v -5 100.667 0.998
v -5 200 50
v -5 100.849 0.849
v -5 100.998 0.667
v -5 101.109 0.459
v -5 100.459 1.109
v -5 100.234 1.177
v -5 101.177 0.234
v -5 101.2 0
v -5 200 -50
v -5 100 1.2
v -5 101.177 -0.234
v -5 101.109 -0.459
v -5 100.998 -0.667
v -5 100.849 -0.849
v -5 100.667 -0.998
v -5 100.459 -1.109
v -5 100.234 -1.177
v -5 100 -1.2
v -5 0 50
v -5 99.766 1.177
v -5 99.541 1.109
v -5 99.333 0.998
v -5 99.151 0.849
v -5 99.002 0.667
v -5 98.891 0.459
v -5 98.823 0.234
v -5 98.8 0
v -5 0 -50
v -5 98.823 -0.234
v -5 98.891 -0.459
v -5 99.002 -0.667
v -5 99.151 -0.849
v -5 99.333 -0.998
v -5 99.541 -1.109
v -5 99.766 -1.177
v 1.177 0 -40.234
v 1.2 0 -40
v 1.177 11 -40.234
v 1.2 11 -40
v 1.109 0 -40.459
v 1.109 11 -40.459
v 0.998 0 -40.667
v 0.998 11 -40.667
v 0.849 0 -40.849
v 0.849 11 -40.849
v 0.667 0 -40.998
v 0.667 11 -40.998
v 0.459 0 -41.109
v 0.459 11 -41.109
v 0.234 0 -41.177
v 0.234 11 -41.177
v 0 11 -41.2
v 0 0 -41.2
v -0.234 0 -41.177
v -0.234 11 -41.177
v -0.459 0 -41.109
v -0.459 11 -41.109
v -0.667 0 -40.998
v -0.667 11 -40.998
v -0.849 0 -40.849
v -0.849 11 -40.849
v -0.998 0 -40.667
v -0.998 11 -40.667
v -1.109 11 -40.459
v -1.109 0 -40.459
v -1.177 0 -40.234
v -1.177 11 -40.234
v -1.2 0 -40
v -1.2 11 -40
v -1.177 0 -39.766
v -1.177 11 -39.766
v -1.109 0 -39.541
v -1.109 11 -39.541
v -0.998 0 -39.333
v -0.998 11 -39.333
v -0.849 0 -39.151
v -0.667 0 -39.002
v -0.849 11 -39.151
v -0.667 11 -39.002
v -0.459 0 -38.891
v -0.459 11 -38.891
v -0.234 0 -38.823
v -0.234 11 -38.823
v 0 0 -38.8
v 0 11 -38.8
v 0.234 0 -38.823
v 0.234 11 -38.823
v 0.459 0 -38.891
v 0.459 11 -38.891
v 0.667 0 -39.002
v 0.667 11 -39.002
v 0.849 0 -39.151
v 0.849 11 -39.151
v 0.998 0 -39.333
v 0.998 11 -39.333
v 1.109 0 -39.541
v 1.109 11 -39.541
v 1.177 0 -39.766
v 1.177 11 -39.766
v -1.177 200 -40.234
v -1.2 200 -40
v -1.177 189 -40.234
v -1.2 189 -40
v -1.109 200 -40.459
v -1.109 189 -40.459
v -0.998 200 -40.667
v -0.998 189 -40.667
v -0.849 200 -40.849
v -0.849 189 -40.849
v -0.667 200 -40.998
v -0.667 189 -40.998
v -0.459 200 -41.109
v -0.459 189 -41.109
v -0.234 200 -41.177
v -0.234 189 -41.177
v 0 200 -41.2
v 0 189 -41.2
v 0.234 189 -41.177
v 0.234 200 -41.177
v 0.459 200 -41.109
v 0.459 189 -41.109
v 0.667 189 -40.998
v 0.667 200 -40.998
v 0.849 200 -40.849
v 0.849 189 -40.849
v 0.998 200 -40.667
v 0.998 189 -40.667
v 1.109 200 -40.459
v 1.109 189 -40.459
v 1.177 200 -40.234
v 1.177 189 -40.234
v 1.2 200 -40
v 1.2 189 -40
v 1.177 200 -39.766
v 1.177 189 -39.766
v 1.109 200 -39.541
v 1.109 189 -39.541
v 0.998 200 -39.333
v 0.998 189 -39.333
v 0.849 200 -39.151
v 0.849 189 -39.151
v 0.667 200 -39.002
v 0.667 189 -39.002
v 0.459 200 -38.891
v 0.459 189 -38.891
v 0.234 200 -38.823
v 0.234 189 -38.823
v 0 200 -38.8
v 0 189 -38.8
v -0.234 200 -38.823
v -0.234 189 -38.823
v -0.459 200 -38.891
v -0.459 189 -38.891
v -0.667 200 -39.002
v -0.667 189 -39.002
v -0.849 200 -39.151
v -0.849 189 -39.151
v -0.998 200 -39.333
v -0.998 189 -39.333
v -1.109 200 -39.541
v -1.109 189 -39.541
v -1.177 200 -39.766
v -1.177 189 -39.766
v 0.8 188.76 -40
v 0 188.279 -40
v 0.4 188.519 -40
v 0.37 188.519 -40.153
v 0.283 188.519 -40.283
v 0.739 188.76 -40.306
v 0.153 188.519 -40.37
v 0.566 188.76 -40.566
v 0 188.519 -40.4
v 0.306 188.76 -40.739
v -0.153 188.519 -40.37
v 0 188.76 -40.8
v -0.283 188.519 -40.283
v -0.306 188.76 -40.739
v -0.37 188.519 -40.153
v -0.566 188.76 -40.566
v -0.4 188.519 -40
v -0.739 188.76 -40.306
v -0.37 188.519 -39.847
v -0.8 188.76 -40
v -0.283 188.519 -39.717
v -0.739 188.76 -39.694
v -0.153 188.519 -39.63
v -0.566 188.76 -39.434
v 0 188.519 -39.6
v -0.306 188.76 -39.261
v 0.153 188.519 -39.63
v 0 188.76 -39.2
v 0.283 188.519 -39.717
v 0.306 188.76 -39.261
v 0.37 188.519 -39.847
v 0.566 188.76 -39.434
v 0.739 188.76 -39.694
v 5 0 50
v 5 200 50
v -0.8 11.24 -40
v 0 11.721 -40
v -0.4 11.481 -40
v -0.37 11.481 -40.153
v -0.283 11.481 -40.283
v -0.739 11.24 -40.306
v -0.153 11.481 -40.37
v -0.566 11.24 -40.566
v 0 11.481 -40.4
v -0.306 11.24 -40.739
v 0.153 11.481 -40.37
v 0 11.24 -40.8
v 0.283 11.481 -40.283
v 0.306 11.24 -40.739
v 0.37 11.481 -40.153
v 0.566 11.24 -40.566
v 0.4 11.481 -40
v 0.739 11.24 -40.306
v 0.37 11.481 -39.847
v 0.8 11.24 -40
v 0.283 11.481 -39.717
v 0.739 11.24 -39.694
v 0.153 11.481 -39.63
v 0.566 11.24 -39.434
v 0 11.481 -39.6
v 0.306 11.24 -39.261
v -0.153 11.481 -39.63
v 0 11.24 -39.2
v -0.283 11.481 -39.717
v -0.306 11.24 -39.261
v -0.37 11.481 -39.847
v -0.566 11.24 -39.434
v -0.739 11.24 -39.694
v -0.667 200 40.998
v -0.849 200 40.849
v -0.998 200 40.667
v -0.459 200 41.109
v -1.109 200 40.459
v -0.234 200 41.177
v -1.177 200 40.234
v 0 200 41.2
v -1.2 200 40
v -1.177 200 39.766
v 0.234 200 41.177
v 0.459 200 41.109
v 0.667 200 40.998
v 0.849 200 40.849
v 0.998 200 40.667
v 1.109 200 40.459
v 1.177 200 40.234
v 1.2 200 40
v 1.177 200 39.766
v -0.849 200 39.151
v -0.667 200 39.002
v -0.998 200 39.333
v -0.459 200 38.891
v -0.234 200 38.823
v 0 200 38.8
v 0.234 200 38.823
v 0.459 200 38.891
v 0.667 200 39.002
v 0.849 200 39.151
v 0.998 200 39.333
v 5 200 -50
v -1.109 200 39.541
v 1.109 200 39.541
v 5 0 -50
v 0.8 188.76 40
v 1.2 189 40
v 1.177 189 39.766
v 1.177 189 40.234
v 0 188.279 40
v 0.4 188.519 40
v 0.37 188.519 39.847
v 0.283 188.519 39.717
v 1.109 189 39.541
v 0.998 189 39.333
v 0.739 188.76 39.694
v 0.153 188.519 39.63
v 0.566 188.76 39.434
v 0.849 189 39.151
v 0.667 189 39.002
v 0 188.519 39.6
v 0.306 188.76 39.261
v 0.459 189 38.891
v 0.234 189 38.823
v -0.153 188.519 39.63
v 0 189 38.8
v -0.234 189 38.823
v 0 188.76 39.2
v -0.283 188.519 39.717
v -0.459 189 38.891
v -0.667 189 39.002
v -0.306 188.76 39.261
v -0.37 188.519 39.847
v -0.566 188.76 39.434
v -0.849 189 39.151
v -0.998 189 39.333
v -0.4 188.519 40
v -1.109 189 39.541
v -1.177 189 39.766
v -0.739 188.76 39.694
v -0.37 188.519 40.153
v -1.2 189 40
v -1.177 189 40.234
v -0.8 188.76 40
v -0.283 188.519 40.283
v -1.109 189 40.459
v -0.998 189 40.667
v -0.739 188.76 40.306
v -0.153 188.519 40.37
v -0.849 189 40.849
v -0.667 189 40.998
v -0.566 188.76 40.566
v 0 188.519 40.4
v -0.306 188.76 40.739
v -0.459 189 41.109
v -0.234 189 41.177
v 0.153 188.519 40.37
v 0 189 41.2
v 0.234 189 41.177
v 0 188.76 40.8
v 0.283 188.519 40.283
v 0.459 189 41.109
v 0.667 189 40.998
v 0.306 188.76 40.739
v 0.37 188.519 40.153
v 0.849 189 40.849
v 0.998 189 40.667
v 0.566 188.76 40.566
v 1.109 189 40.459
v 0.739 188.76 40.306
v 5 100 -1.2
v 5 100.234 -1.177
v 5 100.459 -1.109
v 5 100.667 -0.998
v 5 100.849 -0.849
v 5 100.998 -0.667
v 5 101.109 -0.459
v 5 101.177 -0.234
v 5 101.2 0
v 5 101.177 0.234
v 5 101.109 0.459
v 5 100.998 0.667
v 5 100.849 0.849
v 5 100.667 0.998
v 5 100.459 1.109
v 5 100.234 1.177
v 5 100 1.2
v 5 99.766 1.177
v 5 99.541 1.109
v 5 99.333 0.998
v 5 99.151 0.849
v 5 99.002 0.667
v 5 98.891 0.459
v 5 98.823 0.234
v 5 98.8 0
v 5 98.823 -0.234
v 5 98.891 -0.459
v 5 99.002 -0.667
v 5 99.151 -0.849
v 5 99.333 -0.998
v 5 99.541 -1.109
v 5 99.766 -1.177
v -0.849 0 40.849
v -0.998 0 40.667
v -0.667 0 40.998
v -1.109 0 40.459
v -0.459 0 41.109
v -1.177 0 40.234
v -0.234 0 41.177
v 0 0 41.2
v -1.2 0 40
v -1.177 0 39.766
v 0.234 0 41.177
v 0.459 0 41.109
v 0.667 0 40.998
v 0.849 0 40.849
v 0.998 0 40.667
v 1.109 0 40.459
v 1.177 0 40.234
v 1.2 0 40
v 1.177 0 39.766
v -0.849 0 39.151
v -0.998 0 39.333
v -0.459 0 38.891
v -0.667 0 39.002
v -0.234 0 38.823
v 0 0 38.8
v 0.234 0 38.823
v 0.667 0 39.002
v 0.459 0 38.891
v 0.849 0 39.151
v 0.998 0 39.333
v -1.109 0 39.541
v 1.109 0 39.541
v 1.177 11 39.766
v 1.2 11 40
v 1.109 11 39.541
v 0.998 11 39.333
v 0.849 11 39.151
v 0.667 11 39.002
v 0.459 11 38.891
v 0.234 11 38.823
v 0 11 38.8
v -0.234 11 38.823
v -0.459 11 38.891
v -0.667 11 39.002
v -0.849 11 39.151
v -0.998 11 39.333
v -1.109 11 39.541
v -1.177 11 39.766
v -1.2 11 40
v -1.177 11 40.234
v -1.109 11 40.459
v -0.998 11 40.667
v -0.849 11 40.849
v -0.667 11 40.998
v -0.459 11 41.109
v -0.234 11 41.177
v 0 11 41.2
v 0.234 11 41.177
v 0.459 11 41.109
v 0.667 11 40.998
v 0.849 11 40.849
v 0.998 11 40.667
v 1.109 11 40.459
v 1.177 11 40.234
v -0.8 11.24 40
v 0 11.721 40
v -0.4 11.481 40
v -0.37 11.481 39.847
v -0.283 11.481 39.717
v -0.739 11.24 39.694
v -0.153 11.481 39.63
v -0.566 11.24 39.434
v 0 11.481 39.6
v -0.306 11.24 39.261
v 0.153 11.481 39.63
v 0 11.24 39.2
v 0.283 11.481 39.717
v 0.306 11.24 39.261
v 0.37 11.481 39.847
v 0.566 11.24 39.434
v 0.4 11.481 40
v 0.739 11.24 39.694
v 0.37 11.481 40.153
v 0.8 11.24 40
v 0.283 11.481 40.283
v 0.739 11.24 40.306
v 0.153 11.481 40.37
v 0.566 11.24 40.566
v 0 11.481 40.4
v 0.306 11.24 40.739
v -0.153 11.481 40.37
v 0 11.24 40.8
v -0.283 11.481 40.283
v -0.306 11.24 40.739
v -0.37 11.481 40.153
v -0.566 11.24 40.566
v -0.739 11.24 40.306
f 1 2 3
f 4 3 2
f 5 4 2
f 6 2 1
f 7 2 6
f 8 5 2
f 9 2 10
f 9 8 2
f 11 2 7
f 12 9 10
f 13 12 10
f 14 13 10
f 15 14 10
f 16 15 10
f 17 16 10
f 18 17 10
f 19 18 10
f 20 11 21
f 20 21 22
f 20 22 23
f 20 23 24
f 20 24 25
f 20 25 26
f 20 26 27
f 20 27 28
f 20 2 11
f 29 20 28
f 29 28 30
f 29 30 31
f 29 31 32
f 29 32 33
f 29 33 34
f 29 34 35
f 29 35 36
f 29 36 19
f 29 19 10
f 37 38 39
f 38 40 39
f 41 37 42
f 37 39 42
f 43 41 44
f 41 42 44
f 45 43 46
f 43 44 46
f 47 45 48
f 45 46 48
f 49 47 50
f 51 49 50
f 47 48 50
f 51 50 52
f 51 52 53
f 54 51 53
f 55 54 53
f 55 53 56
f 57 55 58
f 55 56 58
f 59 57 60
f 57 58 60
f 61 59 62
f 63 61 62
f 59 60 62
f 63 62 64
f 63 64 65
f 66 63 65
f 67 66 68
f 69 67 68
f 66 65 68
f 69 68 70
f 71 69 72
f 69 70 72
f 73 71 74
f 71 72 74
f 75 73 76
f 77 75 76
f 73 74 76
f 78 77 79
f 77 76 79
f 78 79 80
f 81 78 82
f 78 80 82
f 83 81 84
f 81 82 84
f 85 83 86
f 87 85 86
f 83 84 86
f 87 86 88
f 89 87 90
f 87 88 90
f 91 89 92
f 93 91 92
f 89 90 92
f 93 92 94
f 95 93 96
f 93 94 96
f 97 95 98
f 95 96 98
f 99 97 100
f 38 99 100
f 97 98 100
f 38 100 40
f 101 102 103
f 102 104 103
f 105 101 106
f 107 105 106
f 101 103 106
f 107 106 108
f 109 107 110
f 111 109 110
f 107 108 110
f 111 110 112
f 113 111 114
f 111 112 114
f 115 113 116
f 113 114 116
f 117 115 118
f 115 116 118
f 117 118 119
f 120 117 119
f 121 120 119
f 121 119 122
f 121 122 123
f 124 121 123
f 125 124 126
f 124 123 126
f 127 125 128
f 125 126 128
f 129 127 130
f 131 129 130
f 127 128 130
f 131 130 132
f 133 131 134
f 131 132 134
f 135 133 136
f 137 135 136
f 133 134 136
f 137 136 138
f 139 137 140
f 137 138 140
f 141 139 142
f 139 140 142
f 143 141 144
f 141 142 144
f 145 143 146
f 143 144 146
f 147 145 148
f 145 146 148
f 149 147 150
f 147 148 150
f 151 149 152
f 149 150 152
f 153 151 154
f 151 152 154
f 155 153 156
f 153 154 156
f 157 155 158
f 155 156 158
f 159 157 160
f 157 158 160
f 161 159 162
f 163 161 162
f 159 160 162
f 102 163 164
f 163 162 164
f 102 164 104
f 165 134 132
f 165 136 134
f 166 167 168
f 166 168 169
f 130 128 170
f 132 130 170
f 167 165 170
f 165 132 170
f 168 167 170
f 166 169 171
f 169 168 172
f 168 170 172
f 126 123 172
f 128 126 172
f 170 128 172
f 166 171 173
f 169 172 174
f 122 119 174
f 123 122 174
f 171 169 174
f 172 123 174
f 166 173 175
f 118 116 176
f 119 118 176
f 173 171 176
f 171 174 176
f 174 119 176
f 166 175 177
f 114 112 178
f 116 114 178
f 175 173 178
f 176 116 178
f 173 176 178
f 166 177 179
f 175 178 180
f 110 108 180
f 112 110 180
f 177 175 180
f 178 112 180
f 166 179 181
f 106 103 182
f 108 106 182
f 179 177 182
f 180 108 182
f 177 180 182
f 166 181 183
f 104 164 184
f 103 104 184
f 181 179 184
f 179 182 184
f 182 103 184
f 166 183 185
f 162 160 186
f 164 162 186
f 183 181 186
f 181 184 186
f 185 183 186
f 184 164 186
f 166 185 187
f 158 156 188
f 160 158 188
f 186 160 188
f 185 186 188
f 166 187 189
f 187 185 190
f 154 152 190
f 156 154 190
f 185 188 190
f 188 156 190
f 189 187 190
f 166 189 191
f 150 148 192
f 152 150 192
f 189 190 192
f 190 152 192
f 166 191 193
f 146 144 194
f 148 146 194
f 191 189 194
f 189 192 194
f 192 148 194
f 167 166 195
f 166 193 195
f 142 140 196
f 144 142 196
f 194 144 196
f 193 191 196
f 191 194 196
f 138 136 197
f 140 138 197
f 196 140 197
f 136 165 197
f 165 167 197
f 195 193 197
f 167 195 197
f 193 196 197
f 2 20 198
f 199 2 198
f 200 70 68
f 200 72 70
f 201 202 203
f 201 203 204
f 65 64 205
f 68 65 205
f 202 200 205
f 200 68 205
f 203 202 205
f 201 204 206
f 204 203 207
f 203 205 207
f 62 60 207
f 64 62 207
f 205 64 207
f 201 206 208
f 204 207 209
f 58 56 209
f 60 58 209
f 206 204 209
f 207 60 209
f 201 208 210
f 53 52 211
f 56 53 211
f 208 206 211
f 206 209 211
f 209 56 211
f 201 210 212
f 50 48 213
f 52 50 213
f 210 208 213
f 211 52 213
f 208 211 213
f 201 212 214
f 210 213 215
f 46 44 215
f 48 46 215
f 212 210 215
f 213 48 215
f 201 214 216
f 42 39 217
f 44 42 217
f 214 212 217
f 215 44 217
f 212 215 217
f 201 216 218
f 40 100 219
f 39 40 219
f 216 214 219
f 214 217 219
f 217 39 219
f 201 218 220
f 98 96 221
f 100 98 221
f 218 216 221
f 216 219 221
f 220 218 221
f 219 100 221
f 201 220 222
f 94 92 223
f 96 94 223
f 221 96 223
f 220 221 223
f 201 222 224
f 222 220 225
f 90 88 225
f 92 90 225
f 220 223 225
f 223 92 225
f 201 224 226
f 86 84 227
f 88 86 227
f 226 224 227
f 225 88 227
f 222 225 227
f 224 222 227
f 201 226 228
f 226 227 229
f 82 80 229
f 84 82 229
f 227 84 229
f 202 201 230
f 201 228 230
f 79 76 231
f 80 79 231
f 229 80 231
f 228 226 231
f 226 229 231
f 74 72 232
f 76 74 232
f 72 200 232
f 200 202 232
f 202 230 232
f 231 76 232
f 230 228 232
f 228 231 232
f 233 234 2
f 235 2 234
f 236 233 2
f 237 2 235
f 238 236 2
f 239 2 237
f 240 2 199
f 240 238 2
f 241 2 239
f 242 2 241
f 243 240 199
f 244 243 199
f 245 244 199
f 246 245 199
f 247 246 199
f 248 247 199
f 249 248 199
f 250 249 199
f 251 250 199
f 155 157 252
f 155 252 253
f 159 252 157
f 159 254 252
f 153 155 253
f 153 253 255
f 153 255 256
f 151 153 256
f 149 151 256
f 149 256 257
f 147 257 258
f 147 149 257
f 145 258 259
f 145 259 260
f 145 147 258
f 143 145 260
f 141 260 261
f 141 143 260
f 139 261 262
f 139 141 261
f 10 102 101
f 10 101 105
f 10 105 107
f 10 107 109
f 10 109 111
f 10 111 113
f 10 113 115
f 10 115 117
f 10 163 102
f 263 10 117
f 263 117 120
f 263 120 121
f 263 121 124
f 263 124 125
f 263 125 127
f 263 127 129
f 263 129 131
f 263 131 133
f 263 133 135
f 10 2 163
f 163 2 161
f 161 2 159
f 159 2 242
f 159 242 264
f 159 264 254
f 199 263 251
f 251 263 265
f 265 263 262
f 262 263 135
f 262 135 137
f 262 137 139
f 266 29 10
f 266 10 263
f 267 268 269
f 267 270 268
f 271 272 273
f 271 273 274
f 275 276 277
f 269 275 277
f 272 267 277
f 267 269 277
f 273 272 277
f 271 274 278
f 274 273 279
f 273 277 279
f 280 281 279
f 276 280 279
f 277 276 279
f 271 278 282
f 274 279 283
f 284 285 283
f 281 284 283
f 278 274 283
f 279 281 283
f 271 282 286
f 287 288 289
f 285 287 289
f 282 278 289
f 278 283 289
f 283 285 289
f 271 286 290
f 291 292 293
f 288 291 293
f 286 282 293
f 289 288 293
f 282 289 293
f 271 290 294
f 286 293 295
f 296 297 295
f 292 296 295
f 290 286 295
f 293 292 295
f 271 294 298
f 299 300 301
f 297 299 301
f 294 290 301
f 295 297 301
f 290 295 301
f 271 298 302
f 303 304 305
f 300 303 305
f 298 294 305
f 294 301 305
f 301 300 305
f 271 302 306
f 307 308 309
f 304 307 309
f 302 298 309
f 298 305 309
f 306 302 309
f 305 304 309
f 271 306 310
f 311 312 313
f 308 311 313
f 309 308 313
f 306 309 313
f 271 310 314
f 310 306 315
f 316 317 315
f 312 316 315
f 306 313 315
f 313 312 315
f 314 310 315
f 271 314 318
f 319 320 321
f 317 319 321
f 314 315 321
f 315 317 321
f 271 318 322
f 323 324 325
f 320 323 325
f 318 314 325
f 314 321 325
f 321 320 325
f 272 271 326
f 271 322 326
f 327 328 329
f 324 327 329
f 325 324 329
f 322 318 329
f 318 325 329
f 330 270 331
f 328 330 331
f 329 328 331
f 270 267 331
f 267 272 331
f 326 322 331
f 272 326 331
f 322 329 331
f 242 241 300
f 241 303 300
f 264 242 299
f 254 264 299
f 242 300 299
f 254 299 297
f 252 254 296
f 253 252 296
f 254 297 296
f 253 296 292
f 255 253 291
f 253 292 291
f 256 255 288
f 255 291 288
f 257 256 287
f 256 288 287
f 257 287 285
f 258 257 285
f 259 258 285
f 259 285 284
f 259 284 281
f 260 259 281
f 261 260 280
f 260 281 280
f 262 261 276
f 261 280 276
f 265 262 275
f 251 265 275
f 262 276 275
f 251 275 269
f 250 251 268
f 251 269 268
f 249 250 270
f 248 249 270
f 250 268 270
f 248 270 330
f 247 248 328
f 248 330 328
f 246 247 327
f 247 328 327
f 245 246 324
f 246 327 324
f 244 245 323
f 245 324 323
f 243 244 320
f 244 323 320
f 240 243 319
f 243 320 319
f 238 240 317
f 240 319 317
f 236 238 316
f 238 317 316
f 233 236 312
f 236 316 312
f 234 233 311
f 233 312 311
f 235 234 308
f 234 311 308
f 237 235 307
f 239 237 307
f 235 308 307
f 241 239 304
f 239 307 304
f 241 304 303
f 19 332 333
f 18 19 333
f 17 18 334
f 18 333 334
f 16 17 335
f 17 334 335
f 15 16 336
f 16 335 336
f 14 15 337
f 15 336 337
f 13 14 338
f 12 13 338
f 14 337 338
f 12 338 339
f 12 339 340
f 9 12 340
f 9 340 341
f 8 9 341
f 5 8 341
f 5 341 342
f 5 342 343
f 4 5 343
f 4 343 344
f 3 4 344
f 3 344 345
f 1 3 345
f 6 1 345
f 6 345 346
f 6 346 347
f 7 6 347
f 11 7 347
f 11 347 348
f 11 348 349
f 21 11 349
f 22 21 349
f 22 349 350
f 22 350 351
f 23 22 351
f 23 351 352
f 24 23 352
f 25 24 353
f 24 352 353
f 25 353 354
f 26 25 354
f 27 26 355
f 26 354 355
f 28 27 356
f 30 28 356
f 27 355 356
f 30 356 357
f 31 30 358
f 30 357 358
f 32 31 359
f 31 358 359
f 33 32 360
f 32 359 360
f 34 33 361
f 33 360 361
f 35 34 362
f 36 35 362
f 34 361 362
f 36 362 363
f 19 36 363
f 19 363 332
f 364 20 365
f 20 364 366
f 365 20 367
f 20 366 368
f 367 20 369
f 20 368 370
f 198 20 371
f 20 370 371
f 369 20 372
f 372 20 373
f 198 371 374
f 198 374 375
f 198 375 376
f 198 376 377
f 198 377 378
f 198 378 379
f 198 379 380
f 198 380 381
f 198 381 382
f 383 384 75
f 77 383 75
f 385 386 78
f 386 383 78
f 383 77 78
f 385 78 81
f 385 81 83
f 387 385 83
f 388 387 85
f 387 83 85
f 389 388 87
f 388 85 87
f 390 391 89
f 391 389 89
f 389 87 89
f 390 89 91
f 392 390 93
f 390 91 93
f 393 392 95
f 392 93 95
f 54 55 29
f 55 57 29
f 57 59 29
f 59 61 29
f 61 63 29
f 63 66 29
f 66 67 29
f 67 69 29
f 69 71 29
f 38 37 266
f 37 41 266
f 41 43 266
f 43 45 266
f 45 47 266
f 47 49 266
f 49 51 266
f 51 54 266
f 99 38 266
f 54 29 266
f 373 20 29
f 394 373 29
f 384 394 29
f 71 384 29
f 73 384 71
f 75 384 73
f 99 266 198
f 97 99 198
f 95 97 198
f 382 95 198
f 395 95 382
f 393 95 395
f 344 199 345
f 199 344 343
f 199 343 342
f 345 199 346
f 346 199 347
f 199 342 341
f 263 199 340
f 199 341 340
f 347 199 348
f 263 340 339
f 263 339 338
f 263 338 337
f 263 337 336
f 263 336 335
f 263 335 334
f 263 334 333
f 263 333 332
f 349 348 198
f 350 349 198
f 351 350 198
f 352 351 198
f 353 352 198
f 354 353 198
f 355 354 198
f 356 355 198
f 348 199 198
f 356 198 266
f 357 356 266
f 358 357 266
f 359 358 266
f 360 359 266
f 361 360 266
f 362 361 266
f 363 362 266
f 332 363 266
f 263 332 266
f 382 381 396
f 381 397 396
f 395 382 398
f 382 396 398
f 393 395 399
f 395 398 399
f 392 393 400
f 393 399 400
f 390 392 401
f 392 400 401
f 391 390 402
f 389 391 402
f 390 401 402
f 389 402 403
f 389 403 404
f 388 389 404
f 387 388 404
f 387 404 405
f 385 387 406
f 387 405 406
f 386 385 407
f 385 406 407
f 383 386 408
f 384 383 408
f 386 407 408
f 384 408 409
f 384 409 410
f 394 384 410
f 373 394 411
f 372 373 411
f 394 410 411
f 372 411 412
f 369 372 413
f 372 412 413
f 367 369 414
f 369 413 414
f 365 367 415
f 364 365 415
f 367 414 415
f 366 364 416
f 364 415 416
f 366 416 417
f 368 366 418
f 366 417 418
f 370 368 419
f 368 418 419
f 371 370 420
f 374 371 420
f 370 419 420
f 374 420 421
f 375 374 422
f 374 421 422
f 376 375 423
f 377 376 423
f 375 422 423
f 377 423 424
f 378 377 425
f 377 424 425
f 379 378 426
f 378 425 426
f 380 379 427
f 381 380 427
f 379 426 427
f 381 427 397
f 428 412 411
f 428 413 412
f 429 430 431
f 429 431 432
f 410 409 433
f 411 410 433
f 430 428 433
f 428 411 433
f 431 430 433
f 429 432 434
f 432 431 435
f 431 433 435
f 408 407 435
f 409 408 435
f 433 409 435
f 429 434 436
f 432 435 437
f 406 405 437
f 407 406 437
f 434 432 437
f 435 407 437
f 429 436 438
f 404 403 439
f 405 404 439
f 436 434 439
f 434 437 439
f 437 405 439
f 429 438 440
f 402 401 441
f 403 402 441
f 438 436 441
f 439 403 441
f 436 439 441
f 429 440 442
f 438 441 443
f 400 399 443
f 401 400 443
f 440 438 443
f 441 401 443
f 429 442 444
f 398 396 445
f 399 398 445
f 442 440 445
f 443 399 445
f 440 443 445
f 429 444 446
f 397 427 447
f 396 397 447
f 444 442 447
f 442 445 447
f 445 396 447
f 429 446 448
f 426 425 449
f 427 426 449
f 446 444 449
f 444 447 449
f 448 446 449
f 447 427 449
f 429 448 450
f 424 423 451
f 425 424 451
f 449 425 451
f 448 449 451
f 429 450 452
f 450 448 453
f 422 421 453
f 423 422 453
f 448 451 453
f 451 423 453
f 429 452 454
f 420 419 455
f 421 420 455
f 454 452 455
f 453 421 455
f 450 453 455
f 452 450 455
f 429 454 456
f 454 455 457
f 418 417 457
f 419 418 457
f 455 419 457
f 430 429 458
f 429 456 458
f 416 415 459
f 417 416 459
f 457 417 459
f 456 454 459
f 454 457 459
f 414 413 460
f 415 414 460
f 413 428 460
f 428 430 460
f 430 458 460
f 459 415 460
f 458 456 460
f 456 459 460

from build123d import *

# Parameters (mm, degrees)
SKETCH1_W                = 10
SKETCH1_H                = 100
BOSS_EXTRUDE1_DEPTH      = 200
M2_CLEARANCE_HOLE1_D     = 2.4
M2_CLEARANCE_HOLE1_DEPTH = 11
M2_CLEARANCE_HOLE1_TIP   = 0.721032743
M2_CLEARANCE_HOLE2_D     = 2.4
M2_CLEARANCE_HOLE2_DEPTH = 11
M2_CLEARANCE_HOLE2_TIP   = 0.721032743
M2_CLEARANCE_HOLE3_D     = 2.4


with BuildPart() as part:
    # Sketch1 → Boss-Extrude1 (new body)
    with BuildSketch(Plane(origin=(0, 0, 0), x_dir=(1, 0, 0), z_dir=(0, 1, 0))):
        Rectangle(SKETCH1_W, SKETCH1_H)
    extrude(amount=BOSS_EXTRUDE1_DEPTH)

    # M2 Clearance Hole1
    with Locations(Plane(origin=(0, 200, 0), x_dir=(1, 0, 0), z_dir=(0, 1, 0))):
        with Locations((0, 40), (0, -40)):
            Hole(M2_CLEARANCE_HOLE1_D / 2, depth=M2_CLEARANCE_HOLE1_DEPTH)
            with Locations((0, 0, -(M2_CLEARANCE_HOLE1_DEPTH + M2_CLEARANCE_HOLE1_TIP / 2))):  # 118° drill point
                Cone(0, M2_CLEARANCE_HOLE1_D / 2, M2_CLEARANCE_HOLE1_TIP, mode=Mode.SUBTRACT)

    # M2 Clearance Hole2
    with Locations(Plane(origin=(0, 0, 0), x_dir=(-1, 0, 0), z_dir=(0, -1, 0))):
        with Locations((0, 40), (0, -40)):
            Hole(M2_CLEARANCE_HOLE2_D / 2, depth=M2_CLEARANCE_HOLE2_DEPTH)
            with Locations((0, 0, -(M2_CLEARANCE_HOLE2_DEPTH + M2_CLEARANCE_HOLE2_TIP / 2))):  # 118° drill point
                Cone(0, M2_CLEARANCE_HOLE2_D / 2, M2_CLEARANCE_HOLE2_TIP, mode=Mode.SUBTRACT)

    # M2 Clearance Hole3 (through all)
    with Locations(Plane.ZY.offset(5)):
        with Locations((0, 100)):
            Hole(M2_CLEARANCE_HOLE3_D / 2)


solid = part.part
